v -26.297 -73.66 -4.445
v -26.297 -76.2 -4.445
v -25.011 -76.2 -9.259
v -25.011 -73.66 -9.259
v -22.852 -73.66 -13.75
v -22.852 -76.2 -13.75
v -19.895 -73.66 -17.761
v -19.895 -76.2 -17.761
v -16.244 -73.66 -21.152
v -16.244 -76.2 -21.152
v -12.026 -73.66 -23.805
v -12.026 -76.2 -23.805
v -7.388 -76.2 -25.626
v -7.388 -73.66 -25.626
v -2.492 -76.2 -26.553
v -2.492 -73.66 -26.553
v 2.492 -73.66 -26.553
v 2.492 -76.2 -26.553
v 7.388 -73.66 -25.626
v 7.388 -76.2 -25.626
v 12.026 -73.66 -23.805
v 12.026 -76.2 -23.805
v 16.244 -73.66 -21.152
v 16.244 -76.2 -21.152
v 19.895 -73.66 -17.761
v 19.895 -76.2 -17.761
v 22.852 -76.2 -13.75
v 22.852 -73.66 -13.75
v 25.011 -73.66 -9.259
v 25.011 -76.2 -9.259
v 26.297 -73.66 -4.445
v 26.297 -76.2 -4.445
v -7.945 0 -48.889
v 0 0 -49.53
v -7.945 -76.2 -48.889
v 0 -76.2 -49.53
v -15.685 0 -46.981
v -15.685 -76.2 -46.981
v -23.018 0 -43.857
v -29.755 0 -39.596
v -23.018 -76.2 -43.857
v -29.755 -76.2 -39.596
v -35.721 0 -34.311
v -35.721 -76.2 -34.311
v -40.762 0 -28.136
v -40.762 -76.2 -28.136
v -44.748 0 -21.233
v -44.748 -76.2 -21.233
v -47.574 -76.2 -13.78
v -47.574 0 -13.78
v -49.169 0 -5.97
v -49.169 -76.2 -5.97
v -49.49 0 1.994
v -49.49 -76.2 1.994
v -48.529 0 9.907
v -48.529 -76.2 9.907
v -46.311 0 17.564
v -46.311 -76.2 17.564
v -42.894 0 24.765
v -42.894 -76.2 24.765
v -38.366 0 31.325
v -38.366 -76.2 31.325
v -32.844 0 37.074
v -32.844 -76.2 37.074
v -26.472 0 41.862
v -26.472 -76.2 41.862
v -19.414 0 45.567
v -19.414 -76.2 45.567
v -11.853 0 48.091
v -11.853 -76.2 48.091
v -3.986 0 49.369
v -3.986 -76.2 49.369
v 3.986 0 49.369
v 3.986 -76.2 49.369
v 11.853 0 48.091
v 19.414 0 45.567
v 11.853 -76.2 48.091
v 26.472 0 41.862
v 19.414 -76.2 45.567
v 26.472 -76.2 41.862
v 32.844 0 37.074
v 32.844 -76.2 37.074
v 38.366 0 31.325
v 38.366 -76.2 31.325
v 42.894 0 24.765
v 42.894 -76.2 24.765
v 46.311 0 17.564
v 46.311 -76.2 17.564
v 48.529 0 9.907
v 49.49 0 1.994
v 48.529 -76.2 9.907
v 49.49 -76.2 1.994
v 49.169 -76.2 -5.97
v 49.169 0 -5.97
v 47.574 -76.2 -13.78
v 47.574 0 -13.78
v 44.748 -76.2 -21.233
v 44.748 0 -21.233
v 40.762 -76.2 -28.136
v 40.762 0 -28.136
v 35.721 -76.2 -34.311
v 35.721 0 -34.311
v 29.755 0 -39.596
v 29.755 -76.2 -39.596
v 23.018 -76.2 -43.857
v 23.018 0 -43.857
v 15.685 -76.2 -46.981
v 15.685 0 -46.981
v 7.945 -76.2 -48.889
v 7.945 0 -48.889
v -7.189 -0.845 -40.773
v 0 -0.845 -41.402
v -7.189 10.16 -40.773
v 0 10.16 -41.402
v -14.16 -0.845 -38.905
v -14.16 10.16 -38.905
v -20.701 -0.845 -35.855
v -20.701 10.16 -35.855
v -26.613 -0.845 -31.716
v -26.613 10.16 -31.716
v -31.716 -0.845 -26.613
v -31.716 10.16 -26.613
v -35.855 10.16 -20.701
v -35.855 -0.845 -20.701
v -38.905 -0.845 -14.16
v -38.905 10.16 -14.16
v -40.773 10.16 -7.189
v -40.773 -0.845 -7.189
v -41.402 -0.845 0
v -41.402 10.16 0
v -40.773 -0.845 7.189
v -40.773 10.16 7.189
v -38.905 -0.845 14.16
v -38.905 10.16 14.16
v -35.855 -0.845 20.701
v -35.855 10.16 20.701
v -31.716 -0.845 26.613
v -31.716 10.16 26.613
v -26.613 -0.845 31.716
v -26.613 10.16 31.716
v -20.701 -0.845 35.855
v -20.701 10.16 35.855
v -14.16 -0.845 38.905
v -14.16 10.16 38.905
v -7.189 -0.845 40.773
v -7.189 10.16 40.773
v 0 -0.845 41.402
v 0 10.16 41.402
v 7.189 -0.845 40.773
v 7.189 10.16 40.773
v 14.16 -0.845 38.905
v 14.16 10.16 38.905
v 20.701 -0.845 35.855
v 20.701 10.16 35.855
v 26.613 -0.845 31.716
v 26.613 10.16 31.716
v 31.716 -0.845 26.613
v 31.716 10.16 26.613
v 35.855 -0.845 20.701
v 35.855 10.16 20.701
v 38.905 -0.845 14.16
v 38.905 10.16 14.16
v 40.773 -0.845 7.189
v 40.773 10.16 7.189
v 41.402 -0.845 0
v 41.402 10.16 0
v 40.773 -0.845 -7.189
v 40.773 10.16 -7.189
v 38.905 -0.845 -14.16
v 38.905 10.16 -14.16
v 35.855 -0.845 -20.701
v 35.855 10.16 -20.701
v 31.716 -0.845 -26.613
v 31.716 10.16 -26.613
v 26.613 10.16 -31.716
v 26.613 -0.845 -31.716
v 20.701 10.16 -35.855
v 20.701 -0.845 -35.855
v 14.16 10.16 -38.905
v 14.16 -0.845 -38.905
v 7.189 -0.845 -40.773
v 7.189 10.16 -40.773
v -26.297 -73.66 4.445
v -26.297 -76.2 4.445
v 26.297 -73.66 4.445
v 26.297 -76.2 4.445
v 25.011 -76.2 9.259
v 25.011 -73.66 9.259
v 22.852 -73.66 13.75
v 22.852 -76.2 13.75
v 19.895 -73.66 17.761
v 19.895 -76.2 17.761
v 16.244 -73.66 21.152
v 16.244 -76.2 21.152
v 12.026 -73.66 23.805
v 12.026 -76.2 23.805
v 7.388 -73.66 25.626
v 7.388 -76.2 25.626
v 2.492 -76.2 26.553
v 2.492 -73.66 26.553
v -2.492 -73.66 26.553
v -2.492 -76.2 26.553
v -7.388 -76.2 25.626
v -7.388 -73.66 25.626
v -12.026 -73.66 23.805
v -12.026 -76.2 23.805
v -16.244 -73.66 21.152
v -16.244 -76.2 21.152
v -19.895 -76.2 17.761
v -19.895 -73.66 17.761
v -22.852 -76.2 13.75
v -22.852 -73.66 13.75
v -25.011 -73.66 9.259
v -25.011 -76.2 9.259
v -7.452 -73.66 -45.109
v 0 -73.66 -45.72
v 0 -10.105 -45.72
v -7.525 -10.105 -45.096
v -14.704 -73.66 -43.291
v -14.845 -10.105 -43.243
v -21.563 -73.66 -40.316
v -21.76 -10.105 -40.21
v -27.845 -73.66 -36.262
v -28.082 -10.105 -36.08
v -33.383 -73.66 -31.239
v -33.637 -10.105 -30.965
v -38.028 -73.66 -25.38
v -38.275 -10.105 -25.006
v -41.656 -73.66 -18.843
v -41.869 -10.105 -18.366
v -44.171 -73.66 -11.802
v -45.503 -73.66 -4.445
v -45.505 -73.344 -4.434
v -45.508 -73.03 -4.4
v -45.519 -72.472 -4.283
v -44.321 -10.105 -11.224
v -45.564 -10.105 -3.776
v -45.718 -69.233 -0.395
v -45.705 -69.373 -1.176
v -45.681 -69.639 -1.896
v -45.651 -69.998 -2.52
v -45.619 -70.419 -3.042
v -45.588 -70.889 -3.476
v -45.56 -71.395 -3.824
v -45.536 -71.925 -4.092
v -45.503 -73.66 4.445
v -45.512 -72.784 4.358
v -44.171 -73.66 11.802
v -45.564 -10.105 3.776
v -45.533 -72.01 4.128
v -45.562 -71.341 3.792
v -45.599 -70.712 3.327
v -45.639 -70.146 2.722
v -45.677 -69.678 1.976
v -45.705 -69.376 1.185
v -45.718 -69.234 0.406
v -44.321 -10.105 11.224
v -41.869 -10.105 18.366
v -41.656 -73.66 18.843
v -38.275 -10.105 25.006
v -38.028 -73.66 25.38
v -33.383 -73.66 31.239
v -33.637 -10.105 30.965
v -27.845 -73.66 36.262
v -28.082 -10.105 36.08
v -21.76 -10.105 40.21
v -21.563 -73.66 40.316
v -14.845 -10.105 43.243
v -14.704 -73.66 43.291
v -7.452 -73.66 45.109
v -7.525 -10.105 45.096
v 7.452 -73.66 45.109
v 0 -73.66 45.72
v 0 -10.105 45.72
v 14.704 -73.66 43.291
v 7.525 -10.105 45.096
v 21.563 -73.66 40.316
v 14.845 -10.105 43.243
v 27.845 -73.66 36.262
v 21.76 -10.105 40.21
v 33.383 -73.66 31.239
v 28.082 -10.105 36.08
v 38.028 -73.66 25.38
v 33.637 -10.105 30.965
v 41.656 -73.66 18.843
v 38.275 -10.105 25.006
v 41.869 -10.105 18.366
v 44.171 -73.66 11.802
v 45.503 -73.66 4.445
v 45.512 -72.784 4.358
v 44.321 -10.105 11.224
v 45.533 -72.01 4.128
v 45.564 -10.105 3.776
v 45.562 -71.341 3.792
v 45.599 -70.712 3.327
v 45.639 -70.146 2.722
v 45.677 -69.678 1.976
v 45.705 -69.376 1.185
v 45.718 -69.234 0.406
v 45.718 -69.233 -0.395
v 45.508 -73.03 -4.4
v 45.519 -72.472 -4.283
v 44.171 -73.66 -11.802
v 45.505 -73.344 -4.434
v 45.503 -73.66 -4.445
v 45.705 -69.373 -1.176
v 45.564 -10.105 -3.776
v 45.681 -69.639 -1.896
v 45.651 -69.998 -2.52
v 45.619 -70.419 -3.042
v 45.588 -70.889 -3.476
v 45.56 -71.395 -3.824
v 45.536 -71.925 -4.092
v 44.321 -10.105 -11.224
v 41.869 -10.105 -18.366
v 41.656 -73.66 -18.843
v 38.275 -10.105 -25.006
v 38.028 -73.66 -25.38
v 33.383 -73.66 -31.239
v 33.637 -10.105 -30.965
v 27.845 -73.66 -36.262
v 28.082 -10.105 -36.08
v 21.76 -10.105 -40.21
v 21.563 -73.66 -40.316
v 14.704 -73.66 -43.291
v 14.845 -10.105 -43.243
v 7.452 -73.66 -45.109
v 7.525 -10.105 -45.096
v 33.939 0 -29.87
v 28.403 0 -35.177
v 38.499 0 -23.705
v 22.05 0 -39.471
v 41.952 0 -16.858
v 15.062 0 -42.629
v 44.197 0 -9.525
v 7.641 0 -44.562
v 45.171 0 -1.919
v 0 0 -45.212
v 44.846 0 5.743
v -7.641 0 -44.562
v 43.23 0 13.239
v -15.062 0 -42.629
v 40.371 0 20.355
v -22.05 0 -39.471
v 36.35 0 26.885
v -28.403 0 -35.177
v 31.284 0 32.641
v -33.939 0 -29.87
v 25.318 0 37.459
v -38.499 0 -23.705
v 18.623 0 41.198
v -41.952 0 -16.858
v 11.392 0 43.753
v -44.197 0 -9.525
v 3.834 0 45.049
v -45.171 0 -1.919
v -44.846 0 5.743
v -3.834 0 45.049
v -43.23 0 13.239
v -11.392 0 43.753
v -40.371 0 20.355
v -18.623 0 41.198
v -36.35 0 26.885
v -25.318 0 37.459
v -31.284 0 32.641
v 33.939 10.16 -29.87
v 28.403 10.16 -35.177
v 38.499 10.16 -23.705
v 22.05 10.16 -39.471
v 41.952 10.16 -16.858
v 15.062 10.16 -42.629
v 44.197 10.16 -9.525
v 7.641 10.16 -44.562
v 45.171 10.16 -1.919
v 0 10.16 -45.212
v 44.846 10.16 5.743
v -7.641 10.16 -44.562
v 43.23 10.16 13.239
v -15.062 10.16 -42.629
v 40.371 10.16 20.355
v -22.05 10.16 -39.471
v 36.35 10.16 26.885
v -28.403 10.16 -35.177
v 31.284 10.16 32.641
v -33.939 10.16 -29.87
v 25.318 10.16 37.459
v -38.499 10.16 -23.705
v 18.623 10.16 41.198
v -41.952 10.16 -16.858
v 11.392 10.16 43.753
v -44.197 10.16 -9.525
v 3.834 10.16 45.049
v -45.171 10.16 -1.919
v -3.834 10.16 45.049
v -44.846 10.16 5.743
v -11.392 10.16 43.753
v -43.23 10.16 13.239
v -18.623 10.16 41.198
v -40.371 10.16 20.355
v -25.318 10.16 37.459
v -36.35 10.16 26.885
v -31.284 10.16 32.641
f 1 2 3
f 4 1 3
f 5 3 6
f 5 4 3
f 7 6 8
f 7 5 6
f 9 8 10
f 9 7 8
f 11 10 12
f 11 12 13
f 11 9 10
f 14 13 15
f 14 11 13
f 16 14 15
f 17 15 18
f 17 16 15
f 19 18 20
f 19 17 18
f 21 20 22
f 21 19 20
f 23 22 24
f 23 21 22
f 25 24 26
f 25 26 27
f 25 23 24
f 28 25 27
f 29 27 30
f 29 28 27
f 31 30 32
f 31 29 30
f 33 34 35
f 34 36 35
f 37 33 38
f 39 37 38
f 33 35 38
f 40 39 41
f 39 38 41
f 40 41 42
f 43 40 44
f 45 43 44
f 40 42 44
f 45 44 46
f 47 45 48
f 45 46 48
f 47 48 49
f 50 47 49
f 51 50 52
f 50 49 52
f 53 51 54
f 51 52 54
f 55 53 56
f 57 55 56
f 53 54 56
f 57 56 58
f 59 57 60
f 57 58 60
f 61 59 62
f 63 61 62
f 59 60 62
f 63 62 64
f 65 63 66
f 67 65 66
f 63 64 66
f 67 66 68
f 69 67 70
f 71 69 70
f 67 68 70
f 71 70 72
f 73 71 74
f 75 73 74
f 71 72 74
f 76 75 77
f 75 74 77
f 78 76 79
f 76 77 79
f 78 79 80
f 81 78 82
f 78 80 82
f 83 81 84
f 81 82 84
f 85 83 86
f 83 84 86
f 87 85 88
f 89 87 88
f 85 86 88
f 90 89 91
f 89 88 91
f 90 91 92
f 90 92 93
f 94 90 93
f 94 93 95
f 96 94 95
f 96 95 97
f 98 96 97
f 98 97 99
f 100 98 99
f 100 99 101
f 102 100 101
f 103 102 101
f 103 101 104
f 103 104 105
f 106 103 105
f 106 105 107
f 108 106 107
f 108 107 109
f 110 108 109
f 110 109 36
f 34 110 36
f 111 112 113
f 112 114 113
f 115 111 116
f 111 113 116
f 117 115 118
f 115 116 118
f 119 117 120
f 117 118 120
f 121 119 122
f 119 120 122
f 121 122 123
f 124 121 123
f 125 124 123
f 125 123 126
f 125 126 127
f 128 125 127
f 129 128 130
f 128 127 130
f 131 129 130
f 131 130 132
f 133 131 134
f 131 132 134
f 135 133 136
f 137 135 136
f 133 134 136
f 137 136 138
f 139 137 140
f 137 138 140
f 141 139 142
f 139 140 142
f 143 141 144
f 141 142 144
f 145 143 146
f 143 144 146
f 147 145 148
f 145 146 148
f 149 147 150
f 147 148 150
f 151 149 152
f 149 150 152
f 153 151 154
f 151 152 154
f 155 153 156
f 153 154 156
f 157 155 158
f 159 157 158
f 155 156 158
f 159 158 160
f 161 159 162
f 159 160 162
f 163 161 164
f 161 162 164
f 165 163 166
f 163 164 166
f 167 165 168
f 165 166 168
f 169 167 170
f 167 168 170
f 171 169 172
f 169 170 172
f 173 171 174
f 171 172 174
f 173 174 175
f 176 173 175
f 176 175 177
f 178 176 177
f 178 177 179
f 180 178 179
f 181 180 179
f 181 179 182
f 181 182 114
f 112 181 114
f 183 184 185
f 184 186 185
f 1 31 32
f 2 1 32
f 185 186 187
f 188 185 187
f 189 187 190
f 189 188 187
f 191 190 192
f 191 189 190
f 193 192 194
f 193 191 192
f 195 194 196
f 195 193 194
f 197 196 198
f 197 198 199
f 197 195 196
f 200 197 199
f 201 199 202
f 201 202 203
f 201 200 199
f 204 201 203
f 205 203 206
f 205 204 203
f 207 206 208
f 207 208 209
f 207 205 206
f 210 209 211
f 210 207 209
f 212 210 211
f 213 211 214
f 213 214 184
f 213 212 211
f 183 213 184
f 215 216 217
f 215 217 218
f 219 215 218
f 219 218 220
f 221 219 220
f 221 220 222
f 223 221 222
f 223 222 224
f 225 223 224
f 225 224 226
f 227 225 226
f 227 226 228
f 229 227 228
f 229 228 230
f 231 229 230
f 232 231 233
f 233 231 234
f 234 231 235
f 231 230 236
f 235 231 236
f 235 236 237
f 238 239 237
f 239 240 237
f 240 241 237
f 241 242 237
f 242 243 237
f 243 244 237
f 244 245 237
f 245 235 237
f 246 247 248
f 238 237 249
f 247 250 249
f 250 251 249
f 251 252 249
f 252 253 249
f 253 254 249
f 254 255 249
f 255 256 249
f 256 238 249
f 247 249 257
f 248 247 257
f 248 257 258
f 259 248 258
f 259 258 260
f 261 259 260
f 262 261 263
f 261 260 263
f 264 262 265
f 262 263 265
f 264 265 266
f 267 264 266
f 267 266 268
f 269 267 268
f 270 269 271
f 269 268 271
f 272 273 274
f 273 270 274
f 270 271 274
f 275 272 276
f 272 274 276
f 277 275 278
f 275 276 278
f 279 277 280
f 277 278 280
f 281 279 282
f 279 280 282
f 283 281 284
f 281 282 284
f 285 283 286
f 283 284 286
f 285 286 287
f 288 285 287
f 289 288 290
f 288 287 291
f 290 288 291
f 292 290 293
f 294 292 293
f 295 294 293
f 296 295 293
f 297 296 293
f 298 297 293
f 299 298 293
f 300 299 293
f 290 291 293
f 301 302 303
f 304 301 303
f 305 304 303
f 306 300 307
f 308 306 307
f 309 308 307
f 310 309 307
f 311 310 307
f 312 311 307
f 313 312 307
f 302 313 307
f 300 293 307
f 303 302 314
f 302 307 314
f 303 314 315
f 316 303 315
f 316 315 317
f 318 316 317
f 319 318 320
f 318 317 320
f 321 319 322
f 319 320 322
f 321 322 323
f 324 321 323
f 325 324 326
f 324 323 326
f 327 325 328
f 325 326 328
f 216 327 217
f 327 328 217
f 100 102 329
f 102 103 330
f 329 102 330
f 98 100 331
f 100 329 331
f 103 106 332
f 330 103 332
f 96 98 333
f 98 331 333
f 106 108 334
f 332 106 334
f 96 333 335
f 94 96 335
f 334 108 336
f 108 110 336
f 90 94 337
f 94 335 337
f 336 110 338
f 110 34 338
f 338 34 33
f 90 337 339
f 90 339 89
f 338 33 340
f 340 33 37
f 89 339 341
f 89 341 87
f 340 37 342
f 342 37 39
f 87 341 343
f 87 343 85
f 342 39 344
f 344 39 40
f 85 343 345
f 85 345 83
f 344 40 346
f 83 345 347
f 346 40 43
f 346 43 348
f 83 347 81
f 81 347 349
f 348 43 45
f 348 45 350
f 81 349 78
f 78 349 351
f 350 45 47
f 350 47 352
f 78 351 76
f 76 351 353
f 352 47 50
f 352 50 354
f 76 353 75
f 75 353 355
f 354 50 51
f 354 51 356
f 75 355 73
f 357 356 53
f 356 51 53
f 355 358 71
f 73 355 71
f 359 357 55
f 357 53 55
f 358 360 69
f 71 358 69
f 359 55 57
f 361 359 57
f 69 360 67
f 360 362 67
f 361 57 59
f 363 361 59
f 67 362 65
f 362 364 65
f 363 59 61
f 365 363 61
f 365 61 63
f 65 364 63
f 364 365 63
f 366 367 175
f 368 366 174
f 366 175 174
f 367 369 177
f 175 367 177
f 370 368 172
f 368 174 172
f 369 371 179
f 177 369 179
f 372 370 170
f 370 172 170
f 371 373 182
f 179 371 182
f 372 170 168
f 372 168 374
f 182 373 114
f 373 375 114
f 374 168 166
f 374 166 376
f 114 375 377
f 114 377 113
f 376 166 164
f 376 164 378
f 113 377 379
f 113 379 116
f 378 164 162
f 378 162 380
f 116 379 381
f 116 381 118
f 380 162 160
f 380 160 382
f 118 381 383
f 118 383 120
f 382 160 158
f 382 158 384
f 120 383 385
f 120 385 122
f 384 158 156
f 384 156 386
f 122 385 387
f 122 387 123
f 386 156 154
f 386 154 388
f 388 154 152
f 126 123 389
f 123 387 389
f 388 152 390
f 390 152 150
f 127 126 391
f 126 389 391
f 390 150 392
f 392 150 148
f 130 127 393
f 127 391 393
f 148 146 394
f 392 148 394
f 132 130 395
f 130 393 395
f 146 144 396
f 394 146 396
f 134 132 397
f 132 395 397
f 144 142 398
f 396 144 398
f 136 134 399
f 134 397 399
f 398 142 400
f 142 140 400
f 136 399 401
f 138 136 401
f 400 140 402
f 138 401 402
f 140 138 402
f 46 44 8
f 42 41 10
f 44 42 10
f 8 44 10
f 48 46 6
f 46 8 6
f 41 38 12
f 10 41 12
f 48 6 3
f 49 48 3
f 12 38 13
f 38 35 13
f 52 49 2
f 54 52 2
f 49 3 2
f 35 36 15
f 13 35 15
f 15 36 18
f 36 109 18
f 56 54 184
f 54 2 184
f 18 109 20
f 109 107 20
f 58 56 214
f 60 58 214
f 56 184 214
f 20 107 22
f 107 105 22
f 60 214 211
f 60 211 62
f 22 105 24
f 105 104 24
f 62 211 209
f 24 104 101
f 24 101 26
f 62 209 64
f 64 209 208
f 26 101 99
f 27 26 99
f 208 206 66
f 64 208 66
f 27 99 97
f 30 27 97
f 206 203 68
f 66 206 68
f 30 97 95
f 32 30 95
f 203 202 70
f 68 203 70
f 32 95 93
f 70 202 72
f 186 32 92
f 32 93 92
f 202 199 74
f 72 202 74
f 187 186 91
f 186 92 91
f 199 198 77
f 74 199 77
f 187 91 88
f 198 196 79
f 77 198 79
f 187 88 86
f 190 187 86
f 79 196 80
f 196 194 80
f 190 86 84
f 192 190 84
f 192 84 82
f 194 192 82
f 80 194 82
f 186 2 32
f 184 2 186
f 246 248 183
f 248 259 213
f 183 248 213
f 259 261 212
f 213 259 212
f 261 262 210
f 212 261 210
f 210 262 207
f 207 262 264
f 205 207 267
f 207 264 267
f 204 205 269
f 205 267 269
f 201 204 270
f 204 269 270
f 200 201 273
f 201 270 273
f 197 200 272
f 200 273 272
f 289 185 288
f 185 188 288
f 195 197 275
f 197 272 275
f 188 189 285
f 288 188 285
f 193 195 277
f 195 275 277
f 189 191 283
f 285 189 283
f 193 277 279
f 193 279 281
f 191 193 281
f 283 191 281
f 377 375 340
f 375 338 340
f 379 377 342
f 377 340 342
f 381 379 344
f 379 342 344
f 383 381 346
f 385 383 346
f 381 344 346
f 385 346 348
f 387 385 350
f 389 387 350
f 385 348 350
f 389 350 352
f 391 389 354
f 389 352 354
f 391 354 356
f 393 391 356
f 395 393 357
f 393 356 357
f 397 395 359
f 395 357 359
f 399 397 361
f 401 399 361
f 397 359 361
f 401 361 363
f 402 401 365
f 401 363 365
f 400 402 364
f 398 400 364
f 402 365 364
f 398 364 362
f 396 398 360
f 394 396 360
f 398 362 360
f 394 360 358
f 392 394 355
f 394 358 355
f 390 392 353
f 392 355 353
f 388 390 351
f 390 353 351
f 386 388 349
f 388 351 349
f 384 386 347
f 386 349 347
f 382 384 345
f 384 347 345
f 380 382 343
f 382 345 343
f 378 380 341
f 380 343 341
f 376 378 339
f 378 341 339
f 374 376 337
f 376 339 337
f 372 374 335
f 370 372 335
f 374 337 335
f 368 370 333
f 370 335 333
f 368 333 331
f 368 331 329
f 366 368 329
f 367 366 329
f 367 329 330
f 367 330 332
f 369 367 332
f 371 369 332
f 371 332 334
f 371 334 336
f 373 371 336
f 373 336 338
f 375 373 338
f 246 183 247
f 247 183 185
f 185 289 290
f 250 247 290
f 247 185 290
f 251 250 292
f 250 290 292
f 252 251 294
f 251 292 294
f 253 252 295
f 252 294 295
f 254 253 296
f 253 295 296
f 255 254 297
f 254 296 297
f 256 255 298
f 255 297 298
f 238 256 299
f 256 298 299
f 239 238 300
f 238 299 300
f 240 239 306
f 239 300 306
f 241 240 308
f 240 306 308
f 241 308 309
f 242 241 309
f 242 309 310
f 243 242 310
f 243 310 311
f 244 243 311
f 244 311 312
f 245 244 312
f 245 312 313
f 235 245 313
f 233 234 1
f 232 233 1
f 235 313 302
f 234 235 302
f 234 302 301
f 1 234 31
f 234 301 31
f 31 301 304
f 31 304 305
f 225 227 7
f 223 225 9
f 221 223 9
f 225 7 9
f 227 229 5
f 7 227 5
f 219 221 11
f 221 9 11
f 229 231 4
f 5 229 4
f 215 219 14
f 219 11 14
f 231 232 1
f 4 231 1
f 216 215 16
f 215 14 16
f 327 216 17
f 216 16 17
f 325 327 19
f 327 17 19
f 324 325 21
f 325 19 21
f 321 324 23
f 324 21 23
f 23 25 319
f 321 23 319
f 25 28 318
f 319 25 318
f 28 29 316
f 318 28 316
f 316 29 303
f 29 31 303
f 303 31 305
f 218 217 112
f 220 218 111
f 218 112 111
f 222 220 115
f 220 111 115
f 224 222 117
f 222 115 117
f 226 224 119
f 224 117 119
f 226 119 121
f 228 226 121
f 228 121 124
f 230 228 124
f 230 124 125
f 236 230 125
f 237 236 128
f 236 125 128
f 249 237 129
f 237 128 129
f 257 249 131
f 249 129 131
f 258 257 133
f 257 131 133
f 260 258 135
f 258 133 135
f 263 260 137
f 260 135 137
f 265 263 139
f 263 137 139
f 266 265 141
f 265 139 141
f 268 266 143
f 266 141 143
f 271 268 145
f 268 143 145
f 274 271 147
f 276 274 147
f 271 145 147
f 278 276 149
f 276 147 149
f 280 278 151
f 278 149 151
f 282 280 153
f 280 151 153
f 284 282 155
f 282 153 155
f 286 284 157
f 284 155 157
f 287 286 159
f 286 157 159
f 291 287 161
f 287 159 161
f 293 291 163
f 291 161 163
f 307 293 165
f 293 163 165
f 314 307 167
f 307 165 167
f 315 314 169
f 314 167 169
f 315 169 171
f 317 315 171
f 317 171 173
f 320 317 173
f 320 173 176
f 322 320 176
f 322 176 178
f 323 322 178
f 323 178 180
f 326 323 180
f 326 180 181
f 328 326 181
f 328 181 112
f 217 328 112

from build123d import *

# Parameters (mm, degrees)
BOSS_EXTRUDE1_REACH                  = 105.503
BOSS_EXTRUDE1_END_RADIUS             = 45.72
BOSS_EXTRUDE1_DIRECTION_2_REACH      = 105.503
BOSS_EXTRUDE1_DIRECTION_2_END_RADIUS = 45.72
EXTRUDE_THIN1_START                  = -2.54
SKETCH3_R                            = 45.72
SKETCH3_R_2                          = 26.67
EXTRUDE_THIN1_DEPTH                  = 2.54


with BuildPart() as part:
    # Sketch1 → Revolve1 (revolve)
    with BuildSketch(Plane(origin=(0, 0, 0), x_dir=(0, 0, -1), z_dir=(1, 0, 0)), mode=Mode.PRIVATE) as revolve1_sk:
        Polygon((-49.53, 0), (-49.53, -76.2), (-45.72, -76.2), (-45.72, -10.104637547), (-41.402, -0.844656665), (-41.402, 10.16), (-45.212, 10.16), (-45.212, 0), align=None)
    revolve(revolve1_sk.sketch.rotate(Axis((0, 0, 0), (0, 1, 0)), 180), axis=Axis((0, 0, 0), (0, 1, 0)))

    # Boss-Extrude1: up to this cylinder (the profile starts inside it)
    boss_extrude1_end = Plane(origin=(0, -73.102853, 0), z_dir=(0, -1, 0)) * Cylinder(BOSS_EXTRUDE1_END_RADIUS, 303.446, mode=Mode.PRIVATE)
    # Sketch2 → Boss-Extrude1 (add, up to the surface)
    with BuildSketch(Plane(origin=(0, 0, 0), x_dir=(0, 0, -1), z_dir=(1, 0, 0)), mode=Mode.PRIVATE) as boss_extrude1_sk1:
        with BuildLine():
            Line((4.445, -73.66), (4.445, -76.2))
            Line((4.445, -76.2), (-4.445, -76.2))
            Line((-4.445, -76.2), (-4.445, -73.66))
            ThreePointArc((-4.445, -73.66), (0, -69.215), (4.445, -73.66))
        make_face()
    boss_extrude1_tool1 = extrude(boss_extrude1_sk1.sketch, amount=BOSS_EXTRUDE1_REACH, mode=Mode.PRIVATE) & boss_extrude1_end
    add(boss_extrude1_tool1.solids().sort_by_distance((0, -73.102853, 0))[0])

    # Boss-Extrude1 direction 2: up to this cylinder (the profile starts inside it)
    boss_extrude1_direction_2_end = Plane(origin=(0, -73.102853, 0), z_dir=(0, -1, 0)) * Cylinder(BOSS_EXTRUDE1_DIRECTION_2_END_RADIUS, 303.446, mode=Mode.PRIVATE)
    # Sketch2 → Boss-Extrude1 direction 2 (add, up to the surface)
    with BuildSketch(Plane(origin=(0, 0, 0), x_dir=(0, 0, -1), z_dir=(1, 0, 0)), mode=Mode.PRIVATE) as boss_extrude1_direction_2_sk1:
        with BuildLine():
            Line((4.445, -73.66), (4.445, -76.2))
            Line((4.445, -76.2), (-4.445, -76.2))
            Line((-4.445, -76.2), (-4.445, -73.66))
            ThreePointArc((-4.445, -73.66), (0, -69.215), (4.445, -73.66))
        make_face()
    boss_extrude1_direction_2_tool1 = extrude(boss_extrude1_direction_2_sk1.sketch, amount=-BOSS_EXTRUDE1_DIRECTION_2_REACH, mode=Mode.PRIVATE) & boss_extrude1_direction_2_end
    add(boss_extrude1_direction_2_tool1.solids().sort_by_distance((0, -73.102853, 0))[0])

    # Sketch3 → Extrude-Thin1 (add)
    with BuildSketch(Plane.XZ.offset(76.2).offset(EXTRUDE_THIN1_START)):
        Circle(SKETCH3_R)
        Circle(SKETCH3_R_2, mode=Mode.SUBTRACT)
    extrude(amount=EXTRUDE_THIN1_DEPTH)


solid = part.part
